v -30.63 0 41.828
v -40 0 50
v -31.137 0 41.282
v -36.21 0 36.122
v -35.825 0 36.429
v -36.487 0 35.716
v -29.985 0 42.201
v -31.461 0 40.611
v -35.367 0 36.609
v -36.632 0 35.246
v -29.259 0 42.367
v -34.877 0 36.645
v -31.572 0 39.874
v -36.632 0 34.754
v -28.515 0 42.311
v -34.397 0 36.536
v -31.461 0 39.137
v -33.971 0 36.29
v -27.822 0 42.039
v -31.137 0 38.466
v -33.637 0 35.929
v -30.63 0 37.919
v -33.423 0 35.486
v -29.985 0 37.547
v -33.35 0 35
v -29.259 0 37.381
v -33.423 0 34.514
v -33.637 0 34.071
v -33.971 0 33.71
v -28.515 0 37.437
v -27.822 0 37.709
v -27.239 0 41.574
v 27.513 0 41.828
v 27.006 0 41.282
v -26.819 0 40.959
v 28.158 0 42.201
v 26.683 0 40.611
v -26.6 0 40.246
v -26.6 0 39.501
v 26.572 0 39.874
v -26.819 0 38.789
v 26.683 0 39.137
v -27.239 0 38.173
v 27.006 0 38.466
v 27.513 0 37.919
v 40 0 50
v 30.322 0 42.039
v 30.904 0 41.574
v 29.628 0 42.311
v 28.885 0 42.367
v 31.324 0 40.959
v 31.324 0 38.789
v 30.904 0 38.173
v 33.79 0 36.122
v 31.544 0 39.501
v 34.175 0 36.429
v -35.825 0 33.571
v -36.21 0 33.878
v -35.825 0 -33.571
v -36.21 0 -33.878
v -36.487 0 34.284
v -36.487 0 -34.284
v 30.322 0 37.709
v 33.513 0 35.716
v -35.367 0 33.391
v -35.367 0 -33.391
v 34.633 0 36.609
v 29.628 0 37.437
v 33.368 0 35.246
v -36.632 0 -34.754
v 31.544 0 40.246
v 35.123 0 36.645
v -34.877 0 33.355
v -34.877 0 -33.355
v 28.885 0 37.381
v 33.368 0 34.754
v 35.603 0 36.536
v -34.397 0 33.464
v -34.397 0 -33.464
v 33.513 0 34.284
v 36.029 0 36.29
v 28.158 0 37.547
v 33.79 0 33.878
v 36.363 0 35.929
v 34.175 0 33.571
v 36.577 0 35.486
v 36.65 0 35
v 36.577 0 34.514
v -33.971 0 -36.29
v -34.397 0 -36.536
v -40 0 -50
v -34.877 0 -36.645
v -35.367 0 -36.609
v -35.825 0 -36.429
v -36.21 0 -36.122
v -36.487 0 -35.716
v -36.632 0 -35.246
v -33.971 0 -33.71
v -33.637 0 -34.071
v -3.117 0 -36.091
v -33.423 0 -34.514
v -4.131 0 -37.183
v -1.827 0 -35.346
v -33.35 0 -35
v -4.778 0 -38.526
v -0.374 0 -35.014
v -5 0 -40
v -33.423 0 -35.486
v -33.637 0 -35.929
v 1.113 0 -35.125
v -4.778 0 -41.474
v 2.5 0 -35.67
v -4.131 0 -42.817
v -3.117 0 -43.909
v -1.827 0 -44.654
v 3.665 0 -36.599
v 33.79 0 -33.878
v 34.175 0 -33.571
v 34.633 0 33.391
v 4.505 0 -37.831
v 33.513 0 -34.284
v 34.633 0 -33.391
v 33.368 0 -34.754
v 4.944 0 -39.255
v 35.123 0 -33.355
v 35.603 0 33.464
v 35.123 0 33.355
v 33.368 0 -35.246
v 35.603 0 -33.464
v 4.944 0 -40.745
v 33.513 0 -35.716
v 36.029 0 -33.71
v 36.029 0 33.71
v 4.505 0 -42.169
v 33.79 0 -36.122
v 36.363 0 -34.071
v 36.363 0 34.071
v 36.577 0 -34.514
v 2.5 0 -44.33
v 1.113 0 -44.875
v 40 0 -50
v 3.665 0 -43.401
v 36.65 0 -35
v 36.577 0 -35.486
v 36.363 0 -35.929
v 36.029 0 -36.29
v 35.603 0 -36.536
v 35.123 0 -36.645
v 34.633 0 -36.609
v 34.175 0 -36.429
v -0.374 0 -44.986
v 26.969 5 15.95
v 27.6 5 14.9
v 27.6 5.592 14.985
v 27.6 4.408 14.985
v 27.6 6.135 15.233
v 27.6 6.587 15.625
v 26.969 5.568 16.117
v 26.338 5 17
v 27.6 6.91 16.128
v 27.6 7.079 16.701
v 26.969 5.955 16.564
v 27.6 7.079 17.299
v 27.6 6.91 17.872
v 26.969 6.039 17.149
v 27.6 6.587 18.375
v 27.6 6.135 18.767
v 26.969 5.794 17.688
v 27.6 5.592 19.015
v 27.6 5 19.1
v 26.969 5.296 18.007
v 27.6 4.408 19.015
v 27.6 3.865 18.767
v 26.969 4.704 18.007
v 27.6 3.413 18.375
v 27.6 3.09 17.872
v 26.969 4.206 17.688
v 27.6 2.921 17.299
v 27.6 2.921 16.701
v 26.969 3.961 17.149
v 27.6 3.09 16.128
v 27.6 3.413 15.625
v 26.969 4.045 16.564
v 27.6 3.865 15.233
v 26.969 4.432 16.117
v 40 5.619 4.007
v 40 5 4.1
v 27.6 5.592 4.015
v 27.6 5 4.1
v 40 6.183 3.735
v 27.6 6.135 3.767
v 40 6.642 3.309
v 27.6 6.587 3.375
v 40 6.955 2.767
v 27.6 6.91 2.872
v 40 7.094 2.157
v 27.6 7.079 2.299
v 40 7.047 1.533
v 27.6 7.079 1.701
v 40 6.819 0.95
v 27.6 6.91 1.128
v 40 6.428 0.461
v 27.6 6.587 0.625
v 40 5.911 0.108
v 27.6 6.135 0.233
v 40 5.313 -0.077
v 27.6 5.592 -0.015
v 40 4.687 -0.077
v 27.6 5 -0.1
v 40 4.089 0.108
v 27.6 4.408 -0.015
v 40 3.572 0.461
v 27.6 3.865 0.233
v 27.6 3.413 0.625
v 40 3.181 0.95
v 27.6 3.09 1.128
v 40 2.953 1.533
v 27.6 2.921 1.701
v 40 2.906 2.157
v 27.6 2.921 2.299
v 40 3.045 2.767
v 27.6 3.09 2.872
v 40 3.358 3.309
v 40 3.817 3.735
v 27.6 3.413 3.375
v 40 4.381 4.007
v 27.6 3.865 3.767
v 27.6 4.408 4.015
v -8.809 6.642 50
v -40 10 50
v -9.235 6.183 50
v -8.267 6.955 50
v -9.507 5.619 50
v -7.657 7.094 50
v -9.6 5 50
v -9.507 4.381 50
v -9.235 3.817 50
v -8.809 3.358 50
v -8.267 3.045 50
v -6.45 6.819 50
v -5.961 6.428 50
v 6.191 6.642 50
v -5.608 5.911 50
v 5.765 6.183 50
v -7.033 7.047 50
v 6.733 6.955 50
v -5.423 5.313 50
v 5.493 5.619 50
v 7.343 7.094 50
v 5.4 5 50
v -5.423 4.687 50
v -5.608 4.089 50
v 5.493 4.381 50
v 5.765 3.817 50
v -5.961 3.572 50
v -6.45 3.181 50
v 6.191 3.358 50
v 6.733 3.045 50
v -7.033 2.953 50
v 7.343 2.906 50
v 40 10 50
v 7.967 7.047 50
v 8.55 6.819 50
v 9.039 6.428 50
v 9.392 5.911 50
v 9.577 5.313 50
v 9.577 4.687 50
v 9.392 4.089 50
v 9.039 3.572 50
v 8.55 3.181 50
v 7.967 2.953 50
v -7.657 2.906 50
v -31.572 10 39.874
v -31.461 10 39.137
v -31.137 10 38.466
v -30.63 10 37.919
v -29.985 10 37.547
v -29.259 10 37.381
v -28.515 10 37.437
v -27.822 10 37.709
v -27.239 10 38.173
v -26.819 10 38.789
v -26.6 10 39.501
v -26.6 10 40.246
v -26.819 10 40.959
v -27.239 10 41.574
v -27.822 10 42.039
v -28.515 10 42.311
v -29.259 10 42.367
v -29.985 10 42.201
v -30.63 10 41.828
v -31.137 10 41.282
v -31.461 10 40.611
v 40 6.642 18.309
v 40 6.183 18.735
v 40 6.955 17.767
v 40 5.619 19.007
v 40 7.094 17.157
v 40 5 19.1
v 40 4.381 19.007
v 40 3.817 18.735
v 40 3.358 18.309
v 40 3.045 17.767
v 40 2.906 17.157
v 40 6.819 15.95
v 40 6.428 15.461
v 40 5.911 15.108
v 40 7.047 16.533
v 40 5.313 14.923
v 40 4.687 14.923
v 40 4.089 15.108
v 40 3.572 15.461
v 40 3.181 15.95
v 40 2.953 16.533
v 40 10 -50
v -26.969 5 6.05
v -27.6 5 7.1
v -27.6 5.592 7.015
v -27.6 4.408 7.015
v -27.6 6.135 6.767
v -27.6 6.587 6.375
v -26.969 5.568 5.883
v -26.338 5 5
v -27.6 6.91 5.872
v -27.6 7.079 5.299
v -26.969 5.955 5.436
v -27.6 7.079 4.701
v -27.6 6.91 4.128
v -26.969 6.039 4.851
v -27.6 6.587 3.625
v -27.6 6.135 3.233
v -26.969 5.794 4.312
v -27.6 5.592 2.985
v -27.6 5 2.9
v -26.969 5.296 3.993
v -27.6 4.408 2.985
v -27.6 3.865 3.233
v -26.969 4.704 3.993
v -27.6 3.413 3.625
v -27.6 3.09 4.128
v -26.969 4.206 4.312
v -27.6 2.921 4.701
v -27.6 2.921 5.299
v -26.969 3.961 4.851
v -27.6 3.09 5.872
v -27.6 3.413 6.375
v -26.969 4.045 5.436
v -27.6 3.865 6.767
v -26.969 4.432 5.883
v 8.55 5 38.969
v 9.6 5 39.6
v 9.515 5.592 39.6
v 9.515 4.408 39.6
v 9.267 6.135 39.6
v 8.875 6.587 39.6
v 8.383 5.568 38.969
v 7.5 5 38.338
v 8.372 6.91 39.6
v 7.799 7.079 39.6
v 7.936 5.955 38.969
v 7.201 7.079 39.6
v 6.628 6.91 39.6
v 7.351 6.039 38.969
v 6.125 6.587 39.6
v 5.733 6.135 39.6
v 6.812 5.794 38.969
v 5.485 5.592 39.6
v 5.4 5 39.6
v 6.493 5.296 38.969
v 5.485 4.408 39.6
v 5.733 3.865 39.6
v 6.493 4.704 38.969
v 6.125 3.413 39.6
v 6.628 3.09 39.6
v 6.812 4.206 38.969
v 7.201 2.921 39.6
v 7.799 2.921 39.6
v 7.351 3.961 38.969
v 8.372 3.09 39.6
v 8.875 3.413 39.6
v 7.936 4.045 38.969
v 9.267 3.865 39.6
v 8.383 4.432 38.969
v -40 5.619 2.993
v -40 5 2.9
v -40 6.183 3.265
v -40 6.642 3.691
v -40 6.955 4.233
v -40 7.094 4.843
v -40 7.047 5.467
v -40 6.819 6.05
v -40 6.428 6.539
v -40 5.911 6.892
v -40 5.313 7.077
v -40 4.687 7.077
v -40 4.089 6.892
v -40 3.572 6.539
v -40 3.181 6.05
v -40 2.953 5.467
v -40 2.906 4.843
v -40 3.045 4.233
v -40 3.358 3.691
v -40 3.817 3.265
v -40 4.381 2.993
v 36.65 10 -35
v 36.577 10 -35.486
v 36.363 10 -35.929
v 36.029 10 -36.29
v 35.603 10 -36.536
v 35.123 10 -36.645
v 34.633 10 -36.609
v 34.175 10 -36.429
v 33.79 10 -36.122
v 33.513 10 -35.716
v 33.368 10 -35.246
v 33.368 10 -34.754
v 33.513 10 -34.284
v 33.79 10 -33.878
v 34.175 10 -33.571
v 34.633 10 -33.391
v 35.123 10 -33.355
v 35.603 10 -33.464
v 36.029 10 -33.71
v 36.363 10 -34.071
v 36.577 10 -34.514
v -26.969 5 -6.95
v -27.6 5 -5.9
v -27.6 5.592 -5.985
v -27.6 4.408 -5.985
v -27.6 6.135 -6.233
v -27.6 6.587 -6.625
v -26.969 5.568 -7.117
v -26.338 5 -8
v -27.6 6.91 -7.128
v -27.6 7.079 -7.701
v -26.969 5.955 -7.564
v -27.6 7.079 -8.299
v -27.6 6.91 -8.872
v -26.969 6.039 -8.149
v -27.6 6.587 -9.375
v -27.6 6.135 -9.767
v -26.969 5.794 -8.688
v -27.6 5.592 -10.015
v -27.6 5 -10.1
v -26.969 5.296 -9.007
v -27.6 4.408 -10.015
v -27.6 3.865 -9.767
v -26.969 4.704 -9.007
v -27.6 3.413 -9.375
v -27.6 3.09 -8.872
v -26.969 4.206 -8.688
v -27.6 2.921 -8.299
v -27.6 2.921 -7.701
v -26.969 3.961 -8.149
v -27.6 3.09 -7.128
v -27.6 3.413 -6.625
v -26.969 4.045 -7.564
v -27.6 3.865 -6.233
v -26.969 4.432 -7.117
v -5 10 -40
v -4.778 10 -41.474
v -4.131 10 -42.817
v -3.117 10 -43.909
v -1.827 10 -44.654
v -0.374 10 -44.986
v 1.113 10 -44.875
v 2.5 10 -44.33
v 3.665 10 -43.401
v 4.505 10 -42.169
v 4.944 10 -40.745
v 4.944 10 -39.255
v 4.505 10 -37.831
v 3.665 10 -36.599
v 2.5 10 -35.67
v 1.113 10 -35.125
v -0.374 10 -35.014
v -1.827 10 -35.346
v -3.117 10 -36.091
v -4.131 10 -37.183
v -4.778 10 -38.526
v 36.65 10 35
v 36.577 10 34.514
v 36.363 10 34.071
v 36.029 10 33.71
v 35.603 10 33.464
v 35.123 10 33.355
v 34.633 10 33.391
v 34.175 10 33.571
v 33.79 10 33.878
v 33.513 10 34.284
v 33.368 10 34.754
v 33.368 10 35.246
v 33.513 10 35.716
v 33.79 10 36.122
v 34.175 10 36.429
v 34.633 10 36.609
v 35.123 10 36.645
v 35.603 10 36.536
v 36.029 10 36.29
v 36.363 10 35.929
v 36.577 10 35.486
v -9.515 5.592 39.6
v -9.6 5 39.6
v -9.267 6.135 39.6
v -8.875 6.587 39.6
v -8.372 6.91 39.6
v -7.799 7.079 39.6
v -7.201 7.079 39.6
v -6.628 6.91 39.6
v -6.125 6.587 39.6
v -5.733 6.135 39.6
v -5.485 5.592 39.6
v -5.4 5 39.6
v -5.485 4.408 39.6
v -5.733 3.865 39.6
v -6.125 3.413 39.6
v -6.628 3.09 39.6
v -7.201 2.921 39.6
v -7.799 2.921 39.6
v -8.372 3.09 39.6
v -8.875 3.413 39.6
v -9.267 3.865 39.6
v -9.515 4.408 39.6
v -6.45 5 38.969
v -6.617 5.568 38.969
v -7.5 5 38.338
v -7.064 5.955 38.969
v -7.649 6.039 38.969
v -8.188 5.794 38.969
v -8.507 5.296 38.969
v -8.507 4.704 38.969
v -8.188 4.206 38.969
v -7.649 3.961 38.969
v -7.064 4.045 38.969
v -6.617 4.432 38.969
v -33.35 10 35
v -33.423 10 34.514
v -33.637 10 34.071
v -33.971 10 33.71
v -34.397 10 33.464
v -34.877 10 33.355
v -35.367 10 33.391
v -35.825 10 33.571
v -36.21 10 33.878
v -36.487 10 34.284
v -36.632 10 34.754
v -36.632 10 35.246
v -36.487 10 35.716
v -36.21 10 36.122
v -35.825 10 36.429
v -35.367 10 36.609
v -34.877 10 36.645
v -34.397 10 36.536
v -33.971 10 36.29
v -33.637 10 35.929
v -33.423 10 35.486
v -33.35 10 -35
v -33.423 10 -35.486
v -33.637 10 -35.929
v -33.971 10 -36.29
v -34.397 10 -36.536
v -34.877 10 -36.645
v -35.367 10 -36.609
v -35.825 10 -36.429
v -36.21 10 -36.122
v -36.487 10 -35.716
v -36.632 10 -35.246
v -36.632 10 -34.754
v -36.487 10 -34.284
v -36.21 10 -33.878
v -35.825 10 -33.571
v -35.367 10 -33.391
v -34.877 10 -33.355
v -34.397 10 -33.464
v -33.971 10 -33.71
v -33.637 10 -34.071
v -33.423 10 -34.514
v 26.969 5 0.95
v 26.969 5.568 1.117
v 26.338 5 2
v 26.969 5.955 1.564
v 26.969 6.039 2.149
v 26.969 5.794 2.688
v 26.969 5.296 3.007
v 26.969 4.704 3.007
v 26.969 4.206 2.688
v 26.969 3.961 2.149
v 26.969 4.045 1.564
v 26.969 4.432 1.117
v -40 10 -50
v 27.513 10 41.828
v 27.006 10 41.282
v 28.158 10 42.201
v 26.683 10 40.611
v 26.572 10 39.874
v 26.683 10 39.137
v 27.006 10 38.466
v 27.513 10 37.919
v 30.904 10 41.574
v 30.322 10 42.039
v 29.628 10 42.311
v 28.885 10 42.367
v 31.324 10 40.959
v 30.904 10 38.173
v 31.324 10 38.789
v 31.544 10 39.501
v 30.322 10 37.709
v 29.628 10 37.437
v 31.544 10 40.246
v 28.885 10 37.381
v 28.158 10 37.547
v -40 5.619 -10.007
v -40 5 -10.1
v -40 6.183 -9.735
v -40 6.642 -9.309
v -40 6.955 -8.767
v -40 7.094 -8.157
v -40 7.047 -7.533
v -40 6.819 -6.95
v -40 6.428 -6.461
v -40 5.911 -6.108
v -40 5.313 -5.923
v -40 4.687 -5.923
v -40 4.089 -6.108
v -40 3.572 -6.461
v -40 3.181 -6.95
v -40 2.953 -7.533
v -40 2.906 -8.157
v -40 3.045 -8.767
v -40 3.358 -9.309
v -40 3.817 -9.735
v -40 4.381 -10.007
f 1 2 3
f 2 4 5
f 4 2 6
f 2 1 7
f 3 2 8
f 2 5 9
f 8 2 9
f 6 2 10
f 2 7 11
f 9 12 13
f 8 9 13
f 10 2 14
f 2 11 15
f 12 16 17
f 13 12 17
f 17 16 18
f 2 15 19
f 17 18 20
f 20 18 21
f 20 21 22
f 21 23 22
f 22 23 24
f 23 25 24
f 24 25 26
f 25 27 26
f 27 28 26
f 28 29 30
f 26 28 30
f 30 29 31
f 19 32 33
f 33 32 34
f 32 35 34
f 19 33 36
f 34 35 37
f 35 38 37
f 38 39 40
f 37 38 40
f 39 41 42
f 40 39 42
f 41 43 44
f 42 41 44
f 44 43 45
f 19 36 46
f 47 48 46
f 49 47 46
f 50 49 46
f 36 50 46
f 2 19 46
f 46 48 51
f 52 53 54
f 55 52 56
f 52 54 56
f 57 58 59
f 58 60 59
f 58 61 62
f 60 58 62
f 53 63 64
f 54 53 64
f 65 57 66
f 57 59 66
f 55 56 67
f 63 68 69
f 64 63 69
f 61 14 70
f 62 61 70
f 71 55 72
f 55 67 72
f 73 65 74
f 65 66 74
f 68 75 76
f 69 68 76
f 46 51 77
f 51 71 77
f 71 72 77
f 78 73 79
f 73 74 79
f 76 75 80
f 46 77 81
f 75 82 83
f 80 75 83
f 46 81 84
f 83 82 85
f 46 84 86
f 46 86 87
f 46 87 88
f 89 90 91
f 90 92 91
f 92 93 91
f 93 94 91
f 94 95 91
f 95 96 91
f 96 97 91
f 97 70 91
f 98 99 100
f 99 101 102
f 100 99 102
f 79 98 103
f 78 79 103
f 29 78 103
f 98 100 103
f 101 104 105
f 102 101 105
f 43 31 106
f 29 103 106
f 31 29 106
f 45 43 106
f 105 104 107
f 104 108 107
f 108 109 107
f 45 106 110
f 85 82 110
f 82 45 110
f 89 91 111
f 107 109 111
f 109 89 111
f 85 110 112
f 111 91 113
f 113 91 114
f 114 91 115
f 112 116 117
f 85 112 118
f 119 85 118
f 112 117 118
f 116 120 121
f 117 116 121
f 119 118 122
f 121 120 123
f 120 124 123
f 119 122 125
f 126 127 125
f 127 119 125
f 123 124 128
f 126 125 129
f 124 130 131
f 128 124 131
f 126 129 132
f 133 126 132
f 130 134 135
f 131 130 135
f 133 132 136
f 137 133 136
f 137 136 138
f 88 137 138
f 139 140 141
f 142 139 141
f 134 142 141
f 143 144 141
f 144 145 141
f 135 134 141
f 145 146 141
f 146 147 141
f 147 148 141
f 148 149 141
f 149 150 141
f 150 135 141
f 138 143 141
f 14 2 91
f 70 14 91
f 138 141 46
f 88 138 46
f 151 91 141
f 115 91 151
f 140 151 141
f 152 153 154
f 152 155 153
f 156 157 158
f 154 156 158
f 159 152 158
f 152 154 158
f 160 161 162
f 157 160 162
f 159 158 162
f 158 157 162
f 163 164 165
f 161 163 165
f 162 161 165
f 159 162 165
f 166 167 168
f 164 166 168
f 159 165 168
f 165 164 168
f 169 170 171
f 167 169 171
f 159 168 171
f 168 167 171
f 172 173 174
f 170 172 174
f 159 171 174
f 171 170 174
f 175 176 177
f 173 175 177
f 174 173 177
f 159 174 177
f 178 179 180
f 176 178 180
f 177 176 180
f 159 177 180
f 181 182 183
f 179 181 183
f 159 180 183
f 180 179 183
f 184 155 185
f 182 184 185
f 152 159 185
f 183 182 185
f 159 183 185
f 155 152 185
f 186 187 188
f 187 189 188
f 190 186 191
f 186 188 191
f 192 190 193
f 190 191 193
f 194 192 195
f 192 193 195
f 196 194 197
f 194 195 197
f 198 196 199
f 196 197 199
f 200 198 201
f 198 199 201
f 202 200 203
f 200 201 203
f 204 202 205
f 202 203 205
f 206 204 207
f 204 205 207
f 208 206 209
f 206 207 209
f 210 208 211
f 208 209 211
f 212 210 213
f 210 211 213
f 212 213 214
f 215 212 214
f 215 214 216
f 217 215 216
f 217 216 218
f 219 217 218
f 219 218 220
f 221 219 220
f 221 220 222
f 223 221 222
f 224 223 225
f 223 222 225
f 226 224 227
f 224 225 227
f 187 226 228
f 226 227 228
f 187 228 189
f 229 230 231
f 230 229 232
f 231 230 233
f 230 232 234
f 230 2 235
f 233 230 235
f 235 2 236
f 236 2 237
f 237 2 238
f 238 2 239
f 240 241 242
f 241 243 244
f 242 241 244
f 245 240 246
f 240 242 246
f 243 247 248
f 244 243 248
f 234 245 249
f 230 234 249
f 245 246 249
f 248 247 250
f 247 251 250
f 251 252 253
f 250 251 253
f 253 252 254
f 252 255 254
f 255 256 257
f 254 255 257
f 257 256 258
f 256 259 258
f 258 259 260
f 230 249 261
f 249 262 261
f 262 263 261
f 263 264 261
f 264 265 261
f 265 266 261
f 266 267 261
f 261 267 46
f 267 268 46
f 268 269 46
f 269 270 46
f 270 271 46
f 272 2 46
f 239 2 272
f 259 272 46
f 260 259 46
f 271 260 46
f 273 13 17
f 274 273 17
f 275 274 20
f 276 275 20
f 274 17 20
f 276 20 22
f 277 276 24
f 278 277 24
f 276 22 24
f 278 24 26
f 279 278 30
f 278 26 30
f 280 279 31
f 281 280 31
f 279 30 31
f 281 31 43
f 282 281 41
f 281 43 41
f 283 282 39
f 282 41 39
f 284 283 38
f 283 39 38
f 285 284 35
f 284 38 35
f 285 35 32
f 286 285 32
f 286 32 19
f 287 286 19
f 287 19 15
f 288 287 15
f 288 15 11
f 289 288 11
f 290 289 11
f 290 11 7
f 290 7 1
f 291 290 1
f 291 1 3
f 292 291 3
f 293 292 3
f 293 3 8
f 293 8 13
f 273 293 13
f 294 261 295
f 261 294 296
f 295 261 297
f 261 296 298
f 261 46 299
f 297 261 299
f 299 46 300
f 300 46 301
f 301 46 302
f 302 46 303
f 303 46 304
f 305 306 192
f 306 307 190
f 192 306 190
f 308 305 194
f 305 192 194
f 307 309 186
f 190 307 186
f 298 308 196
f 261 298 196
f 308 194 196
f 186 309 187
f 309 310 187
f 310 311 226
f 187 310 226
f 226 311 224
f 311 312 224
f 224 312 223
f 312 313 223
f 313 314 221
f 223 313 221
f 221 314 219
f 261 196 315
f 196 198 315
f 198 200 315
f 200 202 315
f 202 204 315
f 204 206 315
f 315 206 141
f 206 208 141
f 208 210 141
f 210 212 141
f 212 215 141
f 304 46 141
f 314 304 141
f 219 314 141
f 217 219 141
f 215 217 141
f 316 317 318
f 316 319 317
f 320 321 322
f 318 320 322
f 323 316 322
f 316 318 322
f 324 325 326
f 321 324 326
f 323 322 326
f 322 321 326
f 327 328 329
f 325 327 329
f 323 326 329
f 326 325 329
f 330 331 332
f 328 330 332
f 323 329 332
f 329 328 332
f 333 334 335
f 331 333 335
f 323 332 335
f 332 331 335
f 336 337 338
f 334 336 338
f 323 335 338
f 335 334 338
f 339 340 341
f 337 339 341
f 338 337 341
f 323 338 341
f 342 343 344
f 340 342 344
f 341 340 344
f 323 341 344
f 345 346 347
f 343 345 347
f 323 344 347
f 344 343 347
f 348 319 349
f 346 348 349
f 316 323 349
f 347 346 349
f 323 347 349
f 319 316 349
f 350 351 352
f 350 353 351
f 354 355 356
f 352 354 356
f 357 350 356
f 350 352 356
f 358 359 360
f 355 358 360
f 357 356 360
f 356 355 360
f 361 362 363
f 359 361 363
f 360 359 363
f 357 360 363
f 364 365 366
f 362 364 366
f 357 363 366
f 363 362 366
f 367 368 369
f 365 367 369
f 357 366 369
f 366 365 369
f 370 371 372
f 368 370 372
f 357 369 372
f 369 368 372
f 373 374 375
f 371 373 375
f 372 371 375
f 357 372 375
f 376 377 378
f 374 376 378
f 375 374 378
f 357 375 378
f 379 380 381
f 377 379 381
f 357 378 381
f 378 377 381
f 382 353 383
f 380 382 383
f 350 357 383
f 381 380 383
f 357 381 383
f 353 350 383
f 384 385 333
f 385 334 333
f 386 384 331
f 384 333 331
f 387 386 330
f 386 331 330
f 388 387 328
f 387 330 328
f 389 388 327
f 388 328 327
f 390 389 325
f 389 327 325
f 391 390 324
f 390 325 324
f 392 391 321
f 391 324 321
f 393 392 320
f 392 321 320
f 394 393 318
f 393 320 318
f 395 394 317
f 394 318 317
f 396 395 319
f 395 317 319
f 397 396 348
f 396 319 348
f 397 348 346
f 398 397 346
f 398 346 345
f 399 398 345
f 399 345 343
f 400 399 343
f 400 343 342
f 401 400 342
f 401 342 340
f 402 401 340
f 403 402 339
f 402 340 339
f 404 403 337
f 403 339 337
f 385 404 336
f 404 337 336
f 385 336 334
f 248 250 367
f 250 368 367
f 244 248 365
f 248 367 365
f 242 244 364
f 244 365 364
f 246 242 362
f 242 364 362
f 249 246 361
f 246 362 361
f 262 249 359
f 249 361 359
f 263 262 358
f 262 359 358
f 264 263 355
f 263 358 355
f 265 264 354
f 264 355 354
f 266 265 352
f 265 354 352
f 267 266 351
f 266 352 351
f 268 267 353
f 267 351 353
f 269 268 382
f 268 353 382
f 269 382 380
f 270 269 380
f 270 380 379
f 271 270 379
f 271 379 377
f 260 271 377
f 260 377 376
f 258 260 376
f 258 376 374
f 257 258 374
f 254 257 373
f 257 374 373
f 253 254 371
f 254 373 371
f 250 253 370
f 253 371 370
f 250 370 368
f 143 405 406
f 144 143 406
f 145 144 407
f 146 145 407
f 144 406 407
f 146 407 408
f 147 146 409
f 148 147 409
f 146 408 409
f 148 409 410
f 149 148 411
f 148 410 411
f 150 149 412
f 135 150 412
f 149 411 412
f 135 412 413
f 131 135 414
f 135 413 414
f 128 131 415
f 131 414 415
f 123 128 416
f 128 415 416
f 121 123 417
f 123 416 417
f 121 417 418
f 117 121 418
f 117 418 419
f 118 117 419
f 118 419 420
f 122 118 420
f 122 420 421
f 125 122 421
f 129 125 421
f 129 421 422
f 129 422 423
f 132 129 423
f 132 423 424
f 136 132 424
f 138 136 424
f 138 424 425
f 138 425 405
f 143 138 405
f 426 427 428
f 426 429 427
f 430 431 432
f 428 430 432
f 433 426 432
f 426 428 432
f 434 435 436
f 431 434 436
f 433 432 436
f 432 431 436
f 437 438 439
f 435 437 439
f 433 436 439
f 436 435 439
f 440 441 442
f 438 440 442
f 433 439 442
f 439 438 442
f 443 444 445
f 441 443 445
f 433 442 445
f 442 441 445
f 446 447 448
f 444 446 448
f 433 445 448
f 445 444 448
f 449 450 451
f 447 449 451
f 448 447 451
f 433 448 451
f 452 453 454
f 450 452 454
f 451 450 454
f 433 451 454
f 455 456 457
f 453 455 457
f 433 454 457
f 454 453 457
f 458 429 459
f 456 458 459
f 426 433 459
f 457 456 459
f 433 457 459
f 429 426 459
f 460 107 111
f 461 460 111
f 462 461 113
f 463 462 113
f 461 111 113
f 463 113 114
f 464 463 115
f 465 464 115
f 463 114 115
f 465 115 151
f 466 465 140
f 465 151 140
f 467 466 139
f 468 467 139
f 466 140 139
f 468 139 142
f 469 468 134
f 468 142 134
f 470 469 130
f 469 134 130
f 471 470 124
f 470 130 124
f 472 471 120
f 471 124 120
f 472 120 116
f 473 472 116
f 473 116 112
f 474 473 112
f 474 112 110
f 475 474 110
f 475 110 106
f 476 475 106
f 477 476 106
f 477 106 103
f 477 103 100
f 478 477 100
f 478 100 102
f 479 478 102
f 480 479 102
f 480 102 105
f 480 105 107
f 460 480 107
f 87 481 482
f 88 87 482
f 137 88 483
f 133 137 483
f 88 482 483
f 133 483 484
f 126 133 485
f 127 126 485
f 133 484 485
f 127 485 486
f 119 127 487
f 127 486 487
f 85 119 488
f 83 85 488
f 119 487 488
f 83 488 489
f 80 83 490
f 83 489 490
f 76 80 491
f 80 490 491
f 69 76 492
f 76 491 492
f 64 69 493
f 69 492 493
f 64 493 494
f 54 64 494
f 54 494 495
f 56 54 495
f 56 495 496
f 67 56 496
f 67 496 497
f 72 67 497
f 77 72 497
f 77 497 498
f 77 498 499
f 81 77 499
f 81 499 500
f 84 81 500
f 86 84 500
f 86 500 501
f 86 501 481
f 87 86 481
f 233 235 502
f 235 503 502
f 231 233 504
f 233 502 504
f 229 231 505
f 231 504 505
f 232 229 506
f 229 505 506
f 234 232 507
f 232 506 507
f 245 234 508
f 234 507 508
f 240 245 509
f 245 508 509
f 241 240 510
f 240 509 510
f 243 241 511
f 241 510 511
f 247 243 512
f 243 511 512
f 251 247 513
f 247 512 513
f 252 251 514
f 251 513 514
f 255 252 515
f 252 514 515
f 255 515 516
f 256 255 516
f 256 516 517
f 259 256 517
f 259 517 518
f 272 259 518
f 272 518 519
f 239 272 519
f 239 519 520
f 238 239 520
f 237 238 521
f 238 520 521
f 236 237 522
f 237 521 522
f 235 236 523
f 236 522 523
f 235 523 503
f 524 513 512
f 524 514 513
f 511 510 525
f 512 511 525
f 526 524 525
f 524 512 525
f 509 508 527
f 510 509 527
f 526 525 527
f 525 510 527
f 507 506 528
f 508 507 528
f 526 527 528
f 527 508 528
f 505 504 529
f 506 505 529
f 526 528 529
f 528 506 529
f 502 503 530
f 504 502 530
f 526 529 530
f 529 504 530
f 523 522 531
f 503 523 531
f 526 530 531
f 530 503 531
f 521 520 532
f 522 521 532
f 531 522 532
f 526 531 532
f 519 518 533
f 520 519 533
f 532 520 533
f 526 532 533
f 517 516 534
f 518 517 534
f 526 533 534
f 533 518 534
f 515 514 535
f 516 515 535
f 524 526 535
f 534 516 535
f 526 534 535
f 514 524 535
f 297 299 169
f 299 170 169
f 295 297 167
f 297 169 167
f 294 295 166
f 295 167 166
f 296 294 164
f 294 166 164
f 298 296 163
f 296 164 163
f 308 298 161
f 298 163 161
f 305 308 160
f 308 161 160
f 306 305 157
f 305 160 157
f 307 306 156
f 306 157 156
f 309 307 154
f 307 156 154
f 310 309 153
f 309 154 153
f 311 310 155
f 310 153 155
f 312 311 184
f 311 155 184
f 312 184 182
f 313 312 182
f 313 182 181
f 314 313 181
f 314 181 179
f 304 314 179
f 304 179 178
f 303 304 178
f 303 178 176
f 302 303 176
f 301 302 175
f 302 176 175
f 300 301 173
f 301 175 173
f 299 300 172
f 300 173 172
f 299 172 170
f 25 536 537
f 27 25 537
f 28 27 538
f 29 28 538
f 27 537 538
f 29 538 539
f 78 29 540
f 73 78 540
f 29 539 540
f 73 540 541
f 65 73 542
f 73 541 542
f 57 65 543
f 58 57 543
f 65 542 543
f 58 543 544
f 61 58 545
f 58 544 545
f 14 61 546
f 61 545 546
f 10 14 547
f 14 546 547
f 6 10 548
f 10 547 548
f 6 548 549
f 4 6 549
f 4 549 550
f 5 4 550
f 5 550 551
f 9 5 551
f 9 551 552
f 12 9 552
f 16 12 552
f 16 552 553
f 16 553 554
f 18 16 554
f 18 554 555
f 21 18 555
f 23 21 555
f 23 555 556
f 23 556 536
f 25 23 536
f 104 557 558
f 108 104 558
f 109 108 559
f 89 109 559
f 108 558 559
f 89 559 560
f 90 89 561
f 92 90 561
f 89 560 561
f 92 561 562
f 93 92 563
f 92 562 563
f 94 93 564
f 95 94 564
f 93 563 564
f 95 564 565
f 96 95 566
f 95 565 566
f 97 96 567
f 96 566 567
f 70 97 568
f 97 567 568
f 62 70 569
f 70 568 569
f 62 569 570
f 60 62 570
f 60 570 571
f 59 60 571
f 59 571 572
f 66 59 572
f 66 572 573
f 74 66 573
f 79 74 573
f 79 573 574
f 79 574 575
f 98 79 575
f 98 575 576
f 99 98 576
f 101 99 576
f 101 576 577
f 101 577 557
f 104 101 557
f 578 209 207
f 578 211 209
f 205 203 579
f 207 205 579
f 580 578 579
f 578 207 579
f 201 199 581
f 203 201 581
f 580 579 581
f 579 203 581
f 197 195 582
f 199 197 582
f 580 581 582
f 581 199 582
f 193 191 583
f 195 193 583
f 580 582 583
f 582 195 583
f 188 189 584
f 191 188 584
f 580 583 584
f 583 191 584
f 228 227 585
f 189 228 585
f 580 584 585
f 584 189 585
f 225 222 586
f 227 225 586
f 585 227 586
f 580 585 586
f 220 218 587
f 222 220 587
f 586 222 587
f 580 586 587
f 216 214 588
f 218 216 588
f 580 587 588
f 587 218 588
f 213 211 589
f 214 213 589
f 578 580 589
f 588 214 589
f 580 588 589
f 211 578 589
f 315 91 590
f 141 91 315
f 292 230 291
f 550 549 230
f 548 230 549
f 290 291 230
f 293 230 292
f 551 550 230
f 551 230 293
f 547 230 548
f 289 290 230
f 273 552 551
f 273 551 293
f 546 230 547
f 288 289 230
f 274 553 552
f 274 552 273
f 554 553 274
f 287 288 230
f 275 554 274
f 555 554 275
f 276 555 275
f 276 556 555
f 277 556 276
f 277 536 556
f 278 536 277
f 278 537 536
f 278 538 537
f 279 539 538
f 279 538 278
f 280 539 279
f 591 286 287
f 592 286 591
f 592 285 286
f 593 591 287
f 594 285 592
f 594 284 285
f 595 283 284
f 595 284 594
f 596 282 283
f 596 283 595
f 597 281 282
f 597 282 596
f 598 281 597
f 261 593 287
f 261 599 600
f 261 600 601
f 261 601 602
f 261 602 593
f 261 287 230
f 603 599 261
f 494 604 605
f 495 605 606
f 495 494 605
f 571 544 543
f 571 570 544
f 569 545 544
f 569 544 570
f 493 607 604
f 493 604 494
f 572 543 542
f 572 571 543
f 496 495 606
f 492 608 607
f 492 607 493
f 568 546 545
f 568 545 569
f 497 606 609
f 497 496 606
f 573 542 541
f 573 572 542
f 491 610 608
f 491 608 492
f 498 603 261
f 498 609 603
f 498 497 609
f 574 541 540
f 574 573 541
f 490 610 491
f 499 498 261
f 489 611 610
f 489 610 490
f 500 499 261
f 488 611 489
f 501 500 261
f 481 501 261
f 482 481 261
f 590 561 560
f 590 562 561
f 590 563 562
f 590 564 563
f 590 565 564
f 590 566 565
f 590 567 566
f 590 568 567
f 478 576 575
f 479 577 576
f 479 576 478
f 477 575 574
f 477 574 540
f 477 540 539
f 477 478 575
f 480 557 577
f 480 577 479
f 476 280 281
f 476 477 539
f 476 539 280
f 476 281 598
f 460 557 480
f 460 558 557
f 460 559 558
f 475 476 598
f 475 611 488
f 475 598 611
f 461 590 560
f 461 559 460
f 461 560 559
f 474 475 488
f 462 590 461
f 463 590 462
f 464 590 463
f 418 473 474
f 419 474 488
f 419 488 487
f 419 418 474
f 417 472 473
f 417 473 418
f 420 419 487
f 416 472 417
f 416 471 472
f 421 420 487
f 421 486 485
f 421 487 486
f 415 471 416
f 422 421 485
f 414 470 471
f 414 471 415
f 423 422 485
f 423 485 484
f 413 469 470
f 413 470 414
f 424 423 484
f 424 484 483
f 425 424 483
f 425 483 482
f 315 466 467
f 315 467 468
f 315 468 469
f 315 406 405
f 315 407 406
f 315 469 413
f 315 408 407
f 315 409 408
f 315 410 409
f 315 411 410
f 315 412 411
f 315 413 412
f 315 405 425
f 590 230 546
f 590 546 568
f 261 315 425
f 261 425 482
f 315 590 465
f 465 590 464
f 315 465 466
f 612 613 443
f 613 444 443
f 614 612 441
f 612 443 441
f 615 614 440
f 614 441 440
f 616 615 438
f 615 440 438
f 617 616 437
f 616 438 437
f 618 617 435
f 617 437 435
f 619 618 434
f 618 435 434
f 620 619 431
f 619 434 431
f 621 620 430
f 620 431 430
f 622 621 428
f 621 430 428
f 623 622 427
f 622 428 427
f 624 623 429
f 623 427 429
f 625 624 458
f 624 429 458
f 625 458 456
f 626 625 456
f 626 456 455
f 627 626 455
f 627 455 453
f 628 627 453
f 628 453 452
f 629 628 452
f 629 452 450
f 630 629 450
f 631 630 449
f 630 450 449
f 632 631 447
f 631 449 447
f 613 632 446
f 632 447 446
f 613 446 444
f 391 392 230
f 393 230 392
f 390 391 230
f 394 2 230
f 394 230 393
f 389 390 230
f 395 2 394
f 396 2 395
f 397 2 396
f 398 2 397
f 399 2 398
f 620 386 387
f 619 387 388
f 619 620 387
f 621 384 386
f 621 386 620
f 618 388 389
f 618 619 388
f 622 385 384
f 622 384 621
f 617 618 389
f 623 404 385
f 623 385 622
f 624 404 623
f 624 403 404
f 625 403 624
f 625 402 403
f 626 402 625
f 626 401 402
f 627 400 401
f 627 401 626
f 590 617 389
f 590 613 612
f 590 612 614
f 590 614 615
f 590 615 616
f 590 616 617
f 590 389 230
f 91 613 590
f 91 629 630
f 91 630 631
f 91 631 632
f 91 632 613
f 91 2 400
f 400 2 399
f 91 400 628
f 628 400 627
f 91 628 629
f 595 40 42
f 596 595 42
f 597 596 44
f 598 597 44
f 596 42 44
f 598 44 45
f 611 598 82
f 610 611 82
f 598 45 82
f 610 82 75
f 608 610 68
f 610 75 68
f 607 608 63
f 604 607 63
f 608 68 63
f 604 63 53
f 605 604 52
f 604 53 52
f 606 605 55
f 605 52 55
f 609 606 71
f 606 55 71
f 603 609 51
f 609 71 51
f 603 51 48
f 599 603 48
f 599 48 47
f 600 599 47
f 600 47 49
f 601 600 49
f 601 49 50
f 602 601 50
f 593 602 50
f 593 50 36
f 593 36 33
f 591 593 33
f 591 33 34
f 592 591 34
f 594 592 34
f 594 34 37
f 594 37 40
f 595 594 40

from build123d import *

# Parameters (mm, degrees)
SKETCH_1_W             = 80
SKETCH_1_H             = 100
EXTRUDE_1_DEPTH        = 10
HOLE_WIZARD_1_D        = 10
HOLE_WIZARD_M4_1_D     = 3.3
HOLE_WIZARD_M6_1_D     = 5
HOLE_WIZARD_M5_1_D     = 4.2
HOLE_WIZARD_M5_1_DEPTH = 12.4
HOLE_WIZARD_M5_1_TIP   = 1.2618073
HOLE_WIZARD_M5_2_D     = 4.2
HOLE_WIZARD_M5_2_DEPTH = 12.4
HOLE_WIZARD_M5_2_TIP   = 1.2618073
HOLE_WIZARD_M5_3_D     = 4.2
HOLE_WIZARD_M5_3_DEPTH = 10.4
HOLE_WIZARD_M5_3_TIP   = 1.2618073


with BuildPart() as part:
    # 草图1 → 凸台-拉伸1 (new body)
    with BuildSketch(Plane(origin=(0, 0, 0), x_dir=(1, 0, 0), z_dir=(0, 1, 0))):
        Rectangle(SKETCH_1_W, SKETCH_1_H)
    extrude(amount=EXTRUDE_1_DEPTH)

    # 孔1 (through all)
    with Locations(Plane(origin=(0, 10, 0), x_dir=(1, 0, 0), z_dir=(0, 1, 0))):
        with Locations((0, 40)):
            Hole(HOLE_WIZARD_1_D / 2)

    # M4 螺纹孔1 (through all)
    with Locations(Plane(origin=(0, 0, 0), x_dir=(-1, 0, 0), z_dir=(0, -1, 0))):
        with Locations((35, -35), (-35, -35), (-35, 35), (35, 35)):
            Hole(HOLE_WIZARD_M4_1_D / 2)

    # M6 螺纹孔1 (through all)
    with Locations(Plane(origin=(0, 10, 0), x_dir=(1, 0, 0), z_dir=(0, 1, 0))):
        with Locations((-29.071712183, -39.873872767), (29.071712183, -39.873872767)):
            Hole(HOLE_WIZARD_M6_1_D / 2)

    # M5 螺纹孔1
    with Locations(Plane(origin=(40, 0, 0), x_dir=(0, 0, -1), z_dir=(1, 0, 0))):
        with Locations((-17, 5), (-2, 5)):
            Hole(HOLE_WIZARD_M5_1_D / 2, depth=HOLE_WIZARD_M5_1_DEPTH)
            with Locations((0, 0, -(HOLE_WIZARD_M5_1_DEPTH + HOLE_WIZARD_M5_1_TIP / 2))):  # 118° drill point
                Cone(0, HOLE_WIZARD_M5_1_D / 2, HOLE_WIZARD_M5_1_TIP, mode=Mode.SUBTRACT)

    # M5 螺纹孔2
    with Locations(Plane.ZY.offset(40)):
        with Locations((5, 5), (-8, 5)):
            Hole(HOLE_WIZARD_M5_2_D / 2, depth=HOLE_WIZARD_M5_2_DEPTH)
            with Locations((0, 0, -(HOLE_WIZARD_M5_2_DEPTH + HOLE_WIZARD_M5_2_TIP / 2))):  # 118° drill point
                Cone(0, HOLE_WIZARD_M5_2_D / 2, HOLE_WIZARD_M5_2_TIP, mode=Mode.SUBTRACT)

    # M5 螺纹孔3
    with Locations(Plane.XY.offset(50)):
        with Locations((-7.5, 5), (7.5, 5)):
            Hole(HOLE_WIZARD_M5_3_D / 2, depth=HOLE_WIZARD_M5_3_DEPTH)
            with Locations((0, 0, -(HOLE_WIZARD_M5_3_DEPTH + HOLE_WIZARD_M5_3_TIP / 2))):  # 118° drill point
                Cone(0, HOLE_WIZARD_M5_3_D / 2, HOLE_WIZARD_M5_3_TIP, mode=Mode.SUBTRACT)


solid = part.part
